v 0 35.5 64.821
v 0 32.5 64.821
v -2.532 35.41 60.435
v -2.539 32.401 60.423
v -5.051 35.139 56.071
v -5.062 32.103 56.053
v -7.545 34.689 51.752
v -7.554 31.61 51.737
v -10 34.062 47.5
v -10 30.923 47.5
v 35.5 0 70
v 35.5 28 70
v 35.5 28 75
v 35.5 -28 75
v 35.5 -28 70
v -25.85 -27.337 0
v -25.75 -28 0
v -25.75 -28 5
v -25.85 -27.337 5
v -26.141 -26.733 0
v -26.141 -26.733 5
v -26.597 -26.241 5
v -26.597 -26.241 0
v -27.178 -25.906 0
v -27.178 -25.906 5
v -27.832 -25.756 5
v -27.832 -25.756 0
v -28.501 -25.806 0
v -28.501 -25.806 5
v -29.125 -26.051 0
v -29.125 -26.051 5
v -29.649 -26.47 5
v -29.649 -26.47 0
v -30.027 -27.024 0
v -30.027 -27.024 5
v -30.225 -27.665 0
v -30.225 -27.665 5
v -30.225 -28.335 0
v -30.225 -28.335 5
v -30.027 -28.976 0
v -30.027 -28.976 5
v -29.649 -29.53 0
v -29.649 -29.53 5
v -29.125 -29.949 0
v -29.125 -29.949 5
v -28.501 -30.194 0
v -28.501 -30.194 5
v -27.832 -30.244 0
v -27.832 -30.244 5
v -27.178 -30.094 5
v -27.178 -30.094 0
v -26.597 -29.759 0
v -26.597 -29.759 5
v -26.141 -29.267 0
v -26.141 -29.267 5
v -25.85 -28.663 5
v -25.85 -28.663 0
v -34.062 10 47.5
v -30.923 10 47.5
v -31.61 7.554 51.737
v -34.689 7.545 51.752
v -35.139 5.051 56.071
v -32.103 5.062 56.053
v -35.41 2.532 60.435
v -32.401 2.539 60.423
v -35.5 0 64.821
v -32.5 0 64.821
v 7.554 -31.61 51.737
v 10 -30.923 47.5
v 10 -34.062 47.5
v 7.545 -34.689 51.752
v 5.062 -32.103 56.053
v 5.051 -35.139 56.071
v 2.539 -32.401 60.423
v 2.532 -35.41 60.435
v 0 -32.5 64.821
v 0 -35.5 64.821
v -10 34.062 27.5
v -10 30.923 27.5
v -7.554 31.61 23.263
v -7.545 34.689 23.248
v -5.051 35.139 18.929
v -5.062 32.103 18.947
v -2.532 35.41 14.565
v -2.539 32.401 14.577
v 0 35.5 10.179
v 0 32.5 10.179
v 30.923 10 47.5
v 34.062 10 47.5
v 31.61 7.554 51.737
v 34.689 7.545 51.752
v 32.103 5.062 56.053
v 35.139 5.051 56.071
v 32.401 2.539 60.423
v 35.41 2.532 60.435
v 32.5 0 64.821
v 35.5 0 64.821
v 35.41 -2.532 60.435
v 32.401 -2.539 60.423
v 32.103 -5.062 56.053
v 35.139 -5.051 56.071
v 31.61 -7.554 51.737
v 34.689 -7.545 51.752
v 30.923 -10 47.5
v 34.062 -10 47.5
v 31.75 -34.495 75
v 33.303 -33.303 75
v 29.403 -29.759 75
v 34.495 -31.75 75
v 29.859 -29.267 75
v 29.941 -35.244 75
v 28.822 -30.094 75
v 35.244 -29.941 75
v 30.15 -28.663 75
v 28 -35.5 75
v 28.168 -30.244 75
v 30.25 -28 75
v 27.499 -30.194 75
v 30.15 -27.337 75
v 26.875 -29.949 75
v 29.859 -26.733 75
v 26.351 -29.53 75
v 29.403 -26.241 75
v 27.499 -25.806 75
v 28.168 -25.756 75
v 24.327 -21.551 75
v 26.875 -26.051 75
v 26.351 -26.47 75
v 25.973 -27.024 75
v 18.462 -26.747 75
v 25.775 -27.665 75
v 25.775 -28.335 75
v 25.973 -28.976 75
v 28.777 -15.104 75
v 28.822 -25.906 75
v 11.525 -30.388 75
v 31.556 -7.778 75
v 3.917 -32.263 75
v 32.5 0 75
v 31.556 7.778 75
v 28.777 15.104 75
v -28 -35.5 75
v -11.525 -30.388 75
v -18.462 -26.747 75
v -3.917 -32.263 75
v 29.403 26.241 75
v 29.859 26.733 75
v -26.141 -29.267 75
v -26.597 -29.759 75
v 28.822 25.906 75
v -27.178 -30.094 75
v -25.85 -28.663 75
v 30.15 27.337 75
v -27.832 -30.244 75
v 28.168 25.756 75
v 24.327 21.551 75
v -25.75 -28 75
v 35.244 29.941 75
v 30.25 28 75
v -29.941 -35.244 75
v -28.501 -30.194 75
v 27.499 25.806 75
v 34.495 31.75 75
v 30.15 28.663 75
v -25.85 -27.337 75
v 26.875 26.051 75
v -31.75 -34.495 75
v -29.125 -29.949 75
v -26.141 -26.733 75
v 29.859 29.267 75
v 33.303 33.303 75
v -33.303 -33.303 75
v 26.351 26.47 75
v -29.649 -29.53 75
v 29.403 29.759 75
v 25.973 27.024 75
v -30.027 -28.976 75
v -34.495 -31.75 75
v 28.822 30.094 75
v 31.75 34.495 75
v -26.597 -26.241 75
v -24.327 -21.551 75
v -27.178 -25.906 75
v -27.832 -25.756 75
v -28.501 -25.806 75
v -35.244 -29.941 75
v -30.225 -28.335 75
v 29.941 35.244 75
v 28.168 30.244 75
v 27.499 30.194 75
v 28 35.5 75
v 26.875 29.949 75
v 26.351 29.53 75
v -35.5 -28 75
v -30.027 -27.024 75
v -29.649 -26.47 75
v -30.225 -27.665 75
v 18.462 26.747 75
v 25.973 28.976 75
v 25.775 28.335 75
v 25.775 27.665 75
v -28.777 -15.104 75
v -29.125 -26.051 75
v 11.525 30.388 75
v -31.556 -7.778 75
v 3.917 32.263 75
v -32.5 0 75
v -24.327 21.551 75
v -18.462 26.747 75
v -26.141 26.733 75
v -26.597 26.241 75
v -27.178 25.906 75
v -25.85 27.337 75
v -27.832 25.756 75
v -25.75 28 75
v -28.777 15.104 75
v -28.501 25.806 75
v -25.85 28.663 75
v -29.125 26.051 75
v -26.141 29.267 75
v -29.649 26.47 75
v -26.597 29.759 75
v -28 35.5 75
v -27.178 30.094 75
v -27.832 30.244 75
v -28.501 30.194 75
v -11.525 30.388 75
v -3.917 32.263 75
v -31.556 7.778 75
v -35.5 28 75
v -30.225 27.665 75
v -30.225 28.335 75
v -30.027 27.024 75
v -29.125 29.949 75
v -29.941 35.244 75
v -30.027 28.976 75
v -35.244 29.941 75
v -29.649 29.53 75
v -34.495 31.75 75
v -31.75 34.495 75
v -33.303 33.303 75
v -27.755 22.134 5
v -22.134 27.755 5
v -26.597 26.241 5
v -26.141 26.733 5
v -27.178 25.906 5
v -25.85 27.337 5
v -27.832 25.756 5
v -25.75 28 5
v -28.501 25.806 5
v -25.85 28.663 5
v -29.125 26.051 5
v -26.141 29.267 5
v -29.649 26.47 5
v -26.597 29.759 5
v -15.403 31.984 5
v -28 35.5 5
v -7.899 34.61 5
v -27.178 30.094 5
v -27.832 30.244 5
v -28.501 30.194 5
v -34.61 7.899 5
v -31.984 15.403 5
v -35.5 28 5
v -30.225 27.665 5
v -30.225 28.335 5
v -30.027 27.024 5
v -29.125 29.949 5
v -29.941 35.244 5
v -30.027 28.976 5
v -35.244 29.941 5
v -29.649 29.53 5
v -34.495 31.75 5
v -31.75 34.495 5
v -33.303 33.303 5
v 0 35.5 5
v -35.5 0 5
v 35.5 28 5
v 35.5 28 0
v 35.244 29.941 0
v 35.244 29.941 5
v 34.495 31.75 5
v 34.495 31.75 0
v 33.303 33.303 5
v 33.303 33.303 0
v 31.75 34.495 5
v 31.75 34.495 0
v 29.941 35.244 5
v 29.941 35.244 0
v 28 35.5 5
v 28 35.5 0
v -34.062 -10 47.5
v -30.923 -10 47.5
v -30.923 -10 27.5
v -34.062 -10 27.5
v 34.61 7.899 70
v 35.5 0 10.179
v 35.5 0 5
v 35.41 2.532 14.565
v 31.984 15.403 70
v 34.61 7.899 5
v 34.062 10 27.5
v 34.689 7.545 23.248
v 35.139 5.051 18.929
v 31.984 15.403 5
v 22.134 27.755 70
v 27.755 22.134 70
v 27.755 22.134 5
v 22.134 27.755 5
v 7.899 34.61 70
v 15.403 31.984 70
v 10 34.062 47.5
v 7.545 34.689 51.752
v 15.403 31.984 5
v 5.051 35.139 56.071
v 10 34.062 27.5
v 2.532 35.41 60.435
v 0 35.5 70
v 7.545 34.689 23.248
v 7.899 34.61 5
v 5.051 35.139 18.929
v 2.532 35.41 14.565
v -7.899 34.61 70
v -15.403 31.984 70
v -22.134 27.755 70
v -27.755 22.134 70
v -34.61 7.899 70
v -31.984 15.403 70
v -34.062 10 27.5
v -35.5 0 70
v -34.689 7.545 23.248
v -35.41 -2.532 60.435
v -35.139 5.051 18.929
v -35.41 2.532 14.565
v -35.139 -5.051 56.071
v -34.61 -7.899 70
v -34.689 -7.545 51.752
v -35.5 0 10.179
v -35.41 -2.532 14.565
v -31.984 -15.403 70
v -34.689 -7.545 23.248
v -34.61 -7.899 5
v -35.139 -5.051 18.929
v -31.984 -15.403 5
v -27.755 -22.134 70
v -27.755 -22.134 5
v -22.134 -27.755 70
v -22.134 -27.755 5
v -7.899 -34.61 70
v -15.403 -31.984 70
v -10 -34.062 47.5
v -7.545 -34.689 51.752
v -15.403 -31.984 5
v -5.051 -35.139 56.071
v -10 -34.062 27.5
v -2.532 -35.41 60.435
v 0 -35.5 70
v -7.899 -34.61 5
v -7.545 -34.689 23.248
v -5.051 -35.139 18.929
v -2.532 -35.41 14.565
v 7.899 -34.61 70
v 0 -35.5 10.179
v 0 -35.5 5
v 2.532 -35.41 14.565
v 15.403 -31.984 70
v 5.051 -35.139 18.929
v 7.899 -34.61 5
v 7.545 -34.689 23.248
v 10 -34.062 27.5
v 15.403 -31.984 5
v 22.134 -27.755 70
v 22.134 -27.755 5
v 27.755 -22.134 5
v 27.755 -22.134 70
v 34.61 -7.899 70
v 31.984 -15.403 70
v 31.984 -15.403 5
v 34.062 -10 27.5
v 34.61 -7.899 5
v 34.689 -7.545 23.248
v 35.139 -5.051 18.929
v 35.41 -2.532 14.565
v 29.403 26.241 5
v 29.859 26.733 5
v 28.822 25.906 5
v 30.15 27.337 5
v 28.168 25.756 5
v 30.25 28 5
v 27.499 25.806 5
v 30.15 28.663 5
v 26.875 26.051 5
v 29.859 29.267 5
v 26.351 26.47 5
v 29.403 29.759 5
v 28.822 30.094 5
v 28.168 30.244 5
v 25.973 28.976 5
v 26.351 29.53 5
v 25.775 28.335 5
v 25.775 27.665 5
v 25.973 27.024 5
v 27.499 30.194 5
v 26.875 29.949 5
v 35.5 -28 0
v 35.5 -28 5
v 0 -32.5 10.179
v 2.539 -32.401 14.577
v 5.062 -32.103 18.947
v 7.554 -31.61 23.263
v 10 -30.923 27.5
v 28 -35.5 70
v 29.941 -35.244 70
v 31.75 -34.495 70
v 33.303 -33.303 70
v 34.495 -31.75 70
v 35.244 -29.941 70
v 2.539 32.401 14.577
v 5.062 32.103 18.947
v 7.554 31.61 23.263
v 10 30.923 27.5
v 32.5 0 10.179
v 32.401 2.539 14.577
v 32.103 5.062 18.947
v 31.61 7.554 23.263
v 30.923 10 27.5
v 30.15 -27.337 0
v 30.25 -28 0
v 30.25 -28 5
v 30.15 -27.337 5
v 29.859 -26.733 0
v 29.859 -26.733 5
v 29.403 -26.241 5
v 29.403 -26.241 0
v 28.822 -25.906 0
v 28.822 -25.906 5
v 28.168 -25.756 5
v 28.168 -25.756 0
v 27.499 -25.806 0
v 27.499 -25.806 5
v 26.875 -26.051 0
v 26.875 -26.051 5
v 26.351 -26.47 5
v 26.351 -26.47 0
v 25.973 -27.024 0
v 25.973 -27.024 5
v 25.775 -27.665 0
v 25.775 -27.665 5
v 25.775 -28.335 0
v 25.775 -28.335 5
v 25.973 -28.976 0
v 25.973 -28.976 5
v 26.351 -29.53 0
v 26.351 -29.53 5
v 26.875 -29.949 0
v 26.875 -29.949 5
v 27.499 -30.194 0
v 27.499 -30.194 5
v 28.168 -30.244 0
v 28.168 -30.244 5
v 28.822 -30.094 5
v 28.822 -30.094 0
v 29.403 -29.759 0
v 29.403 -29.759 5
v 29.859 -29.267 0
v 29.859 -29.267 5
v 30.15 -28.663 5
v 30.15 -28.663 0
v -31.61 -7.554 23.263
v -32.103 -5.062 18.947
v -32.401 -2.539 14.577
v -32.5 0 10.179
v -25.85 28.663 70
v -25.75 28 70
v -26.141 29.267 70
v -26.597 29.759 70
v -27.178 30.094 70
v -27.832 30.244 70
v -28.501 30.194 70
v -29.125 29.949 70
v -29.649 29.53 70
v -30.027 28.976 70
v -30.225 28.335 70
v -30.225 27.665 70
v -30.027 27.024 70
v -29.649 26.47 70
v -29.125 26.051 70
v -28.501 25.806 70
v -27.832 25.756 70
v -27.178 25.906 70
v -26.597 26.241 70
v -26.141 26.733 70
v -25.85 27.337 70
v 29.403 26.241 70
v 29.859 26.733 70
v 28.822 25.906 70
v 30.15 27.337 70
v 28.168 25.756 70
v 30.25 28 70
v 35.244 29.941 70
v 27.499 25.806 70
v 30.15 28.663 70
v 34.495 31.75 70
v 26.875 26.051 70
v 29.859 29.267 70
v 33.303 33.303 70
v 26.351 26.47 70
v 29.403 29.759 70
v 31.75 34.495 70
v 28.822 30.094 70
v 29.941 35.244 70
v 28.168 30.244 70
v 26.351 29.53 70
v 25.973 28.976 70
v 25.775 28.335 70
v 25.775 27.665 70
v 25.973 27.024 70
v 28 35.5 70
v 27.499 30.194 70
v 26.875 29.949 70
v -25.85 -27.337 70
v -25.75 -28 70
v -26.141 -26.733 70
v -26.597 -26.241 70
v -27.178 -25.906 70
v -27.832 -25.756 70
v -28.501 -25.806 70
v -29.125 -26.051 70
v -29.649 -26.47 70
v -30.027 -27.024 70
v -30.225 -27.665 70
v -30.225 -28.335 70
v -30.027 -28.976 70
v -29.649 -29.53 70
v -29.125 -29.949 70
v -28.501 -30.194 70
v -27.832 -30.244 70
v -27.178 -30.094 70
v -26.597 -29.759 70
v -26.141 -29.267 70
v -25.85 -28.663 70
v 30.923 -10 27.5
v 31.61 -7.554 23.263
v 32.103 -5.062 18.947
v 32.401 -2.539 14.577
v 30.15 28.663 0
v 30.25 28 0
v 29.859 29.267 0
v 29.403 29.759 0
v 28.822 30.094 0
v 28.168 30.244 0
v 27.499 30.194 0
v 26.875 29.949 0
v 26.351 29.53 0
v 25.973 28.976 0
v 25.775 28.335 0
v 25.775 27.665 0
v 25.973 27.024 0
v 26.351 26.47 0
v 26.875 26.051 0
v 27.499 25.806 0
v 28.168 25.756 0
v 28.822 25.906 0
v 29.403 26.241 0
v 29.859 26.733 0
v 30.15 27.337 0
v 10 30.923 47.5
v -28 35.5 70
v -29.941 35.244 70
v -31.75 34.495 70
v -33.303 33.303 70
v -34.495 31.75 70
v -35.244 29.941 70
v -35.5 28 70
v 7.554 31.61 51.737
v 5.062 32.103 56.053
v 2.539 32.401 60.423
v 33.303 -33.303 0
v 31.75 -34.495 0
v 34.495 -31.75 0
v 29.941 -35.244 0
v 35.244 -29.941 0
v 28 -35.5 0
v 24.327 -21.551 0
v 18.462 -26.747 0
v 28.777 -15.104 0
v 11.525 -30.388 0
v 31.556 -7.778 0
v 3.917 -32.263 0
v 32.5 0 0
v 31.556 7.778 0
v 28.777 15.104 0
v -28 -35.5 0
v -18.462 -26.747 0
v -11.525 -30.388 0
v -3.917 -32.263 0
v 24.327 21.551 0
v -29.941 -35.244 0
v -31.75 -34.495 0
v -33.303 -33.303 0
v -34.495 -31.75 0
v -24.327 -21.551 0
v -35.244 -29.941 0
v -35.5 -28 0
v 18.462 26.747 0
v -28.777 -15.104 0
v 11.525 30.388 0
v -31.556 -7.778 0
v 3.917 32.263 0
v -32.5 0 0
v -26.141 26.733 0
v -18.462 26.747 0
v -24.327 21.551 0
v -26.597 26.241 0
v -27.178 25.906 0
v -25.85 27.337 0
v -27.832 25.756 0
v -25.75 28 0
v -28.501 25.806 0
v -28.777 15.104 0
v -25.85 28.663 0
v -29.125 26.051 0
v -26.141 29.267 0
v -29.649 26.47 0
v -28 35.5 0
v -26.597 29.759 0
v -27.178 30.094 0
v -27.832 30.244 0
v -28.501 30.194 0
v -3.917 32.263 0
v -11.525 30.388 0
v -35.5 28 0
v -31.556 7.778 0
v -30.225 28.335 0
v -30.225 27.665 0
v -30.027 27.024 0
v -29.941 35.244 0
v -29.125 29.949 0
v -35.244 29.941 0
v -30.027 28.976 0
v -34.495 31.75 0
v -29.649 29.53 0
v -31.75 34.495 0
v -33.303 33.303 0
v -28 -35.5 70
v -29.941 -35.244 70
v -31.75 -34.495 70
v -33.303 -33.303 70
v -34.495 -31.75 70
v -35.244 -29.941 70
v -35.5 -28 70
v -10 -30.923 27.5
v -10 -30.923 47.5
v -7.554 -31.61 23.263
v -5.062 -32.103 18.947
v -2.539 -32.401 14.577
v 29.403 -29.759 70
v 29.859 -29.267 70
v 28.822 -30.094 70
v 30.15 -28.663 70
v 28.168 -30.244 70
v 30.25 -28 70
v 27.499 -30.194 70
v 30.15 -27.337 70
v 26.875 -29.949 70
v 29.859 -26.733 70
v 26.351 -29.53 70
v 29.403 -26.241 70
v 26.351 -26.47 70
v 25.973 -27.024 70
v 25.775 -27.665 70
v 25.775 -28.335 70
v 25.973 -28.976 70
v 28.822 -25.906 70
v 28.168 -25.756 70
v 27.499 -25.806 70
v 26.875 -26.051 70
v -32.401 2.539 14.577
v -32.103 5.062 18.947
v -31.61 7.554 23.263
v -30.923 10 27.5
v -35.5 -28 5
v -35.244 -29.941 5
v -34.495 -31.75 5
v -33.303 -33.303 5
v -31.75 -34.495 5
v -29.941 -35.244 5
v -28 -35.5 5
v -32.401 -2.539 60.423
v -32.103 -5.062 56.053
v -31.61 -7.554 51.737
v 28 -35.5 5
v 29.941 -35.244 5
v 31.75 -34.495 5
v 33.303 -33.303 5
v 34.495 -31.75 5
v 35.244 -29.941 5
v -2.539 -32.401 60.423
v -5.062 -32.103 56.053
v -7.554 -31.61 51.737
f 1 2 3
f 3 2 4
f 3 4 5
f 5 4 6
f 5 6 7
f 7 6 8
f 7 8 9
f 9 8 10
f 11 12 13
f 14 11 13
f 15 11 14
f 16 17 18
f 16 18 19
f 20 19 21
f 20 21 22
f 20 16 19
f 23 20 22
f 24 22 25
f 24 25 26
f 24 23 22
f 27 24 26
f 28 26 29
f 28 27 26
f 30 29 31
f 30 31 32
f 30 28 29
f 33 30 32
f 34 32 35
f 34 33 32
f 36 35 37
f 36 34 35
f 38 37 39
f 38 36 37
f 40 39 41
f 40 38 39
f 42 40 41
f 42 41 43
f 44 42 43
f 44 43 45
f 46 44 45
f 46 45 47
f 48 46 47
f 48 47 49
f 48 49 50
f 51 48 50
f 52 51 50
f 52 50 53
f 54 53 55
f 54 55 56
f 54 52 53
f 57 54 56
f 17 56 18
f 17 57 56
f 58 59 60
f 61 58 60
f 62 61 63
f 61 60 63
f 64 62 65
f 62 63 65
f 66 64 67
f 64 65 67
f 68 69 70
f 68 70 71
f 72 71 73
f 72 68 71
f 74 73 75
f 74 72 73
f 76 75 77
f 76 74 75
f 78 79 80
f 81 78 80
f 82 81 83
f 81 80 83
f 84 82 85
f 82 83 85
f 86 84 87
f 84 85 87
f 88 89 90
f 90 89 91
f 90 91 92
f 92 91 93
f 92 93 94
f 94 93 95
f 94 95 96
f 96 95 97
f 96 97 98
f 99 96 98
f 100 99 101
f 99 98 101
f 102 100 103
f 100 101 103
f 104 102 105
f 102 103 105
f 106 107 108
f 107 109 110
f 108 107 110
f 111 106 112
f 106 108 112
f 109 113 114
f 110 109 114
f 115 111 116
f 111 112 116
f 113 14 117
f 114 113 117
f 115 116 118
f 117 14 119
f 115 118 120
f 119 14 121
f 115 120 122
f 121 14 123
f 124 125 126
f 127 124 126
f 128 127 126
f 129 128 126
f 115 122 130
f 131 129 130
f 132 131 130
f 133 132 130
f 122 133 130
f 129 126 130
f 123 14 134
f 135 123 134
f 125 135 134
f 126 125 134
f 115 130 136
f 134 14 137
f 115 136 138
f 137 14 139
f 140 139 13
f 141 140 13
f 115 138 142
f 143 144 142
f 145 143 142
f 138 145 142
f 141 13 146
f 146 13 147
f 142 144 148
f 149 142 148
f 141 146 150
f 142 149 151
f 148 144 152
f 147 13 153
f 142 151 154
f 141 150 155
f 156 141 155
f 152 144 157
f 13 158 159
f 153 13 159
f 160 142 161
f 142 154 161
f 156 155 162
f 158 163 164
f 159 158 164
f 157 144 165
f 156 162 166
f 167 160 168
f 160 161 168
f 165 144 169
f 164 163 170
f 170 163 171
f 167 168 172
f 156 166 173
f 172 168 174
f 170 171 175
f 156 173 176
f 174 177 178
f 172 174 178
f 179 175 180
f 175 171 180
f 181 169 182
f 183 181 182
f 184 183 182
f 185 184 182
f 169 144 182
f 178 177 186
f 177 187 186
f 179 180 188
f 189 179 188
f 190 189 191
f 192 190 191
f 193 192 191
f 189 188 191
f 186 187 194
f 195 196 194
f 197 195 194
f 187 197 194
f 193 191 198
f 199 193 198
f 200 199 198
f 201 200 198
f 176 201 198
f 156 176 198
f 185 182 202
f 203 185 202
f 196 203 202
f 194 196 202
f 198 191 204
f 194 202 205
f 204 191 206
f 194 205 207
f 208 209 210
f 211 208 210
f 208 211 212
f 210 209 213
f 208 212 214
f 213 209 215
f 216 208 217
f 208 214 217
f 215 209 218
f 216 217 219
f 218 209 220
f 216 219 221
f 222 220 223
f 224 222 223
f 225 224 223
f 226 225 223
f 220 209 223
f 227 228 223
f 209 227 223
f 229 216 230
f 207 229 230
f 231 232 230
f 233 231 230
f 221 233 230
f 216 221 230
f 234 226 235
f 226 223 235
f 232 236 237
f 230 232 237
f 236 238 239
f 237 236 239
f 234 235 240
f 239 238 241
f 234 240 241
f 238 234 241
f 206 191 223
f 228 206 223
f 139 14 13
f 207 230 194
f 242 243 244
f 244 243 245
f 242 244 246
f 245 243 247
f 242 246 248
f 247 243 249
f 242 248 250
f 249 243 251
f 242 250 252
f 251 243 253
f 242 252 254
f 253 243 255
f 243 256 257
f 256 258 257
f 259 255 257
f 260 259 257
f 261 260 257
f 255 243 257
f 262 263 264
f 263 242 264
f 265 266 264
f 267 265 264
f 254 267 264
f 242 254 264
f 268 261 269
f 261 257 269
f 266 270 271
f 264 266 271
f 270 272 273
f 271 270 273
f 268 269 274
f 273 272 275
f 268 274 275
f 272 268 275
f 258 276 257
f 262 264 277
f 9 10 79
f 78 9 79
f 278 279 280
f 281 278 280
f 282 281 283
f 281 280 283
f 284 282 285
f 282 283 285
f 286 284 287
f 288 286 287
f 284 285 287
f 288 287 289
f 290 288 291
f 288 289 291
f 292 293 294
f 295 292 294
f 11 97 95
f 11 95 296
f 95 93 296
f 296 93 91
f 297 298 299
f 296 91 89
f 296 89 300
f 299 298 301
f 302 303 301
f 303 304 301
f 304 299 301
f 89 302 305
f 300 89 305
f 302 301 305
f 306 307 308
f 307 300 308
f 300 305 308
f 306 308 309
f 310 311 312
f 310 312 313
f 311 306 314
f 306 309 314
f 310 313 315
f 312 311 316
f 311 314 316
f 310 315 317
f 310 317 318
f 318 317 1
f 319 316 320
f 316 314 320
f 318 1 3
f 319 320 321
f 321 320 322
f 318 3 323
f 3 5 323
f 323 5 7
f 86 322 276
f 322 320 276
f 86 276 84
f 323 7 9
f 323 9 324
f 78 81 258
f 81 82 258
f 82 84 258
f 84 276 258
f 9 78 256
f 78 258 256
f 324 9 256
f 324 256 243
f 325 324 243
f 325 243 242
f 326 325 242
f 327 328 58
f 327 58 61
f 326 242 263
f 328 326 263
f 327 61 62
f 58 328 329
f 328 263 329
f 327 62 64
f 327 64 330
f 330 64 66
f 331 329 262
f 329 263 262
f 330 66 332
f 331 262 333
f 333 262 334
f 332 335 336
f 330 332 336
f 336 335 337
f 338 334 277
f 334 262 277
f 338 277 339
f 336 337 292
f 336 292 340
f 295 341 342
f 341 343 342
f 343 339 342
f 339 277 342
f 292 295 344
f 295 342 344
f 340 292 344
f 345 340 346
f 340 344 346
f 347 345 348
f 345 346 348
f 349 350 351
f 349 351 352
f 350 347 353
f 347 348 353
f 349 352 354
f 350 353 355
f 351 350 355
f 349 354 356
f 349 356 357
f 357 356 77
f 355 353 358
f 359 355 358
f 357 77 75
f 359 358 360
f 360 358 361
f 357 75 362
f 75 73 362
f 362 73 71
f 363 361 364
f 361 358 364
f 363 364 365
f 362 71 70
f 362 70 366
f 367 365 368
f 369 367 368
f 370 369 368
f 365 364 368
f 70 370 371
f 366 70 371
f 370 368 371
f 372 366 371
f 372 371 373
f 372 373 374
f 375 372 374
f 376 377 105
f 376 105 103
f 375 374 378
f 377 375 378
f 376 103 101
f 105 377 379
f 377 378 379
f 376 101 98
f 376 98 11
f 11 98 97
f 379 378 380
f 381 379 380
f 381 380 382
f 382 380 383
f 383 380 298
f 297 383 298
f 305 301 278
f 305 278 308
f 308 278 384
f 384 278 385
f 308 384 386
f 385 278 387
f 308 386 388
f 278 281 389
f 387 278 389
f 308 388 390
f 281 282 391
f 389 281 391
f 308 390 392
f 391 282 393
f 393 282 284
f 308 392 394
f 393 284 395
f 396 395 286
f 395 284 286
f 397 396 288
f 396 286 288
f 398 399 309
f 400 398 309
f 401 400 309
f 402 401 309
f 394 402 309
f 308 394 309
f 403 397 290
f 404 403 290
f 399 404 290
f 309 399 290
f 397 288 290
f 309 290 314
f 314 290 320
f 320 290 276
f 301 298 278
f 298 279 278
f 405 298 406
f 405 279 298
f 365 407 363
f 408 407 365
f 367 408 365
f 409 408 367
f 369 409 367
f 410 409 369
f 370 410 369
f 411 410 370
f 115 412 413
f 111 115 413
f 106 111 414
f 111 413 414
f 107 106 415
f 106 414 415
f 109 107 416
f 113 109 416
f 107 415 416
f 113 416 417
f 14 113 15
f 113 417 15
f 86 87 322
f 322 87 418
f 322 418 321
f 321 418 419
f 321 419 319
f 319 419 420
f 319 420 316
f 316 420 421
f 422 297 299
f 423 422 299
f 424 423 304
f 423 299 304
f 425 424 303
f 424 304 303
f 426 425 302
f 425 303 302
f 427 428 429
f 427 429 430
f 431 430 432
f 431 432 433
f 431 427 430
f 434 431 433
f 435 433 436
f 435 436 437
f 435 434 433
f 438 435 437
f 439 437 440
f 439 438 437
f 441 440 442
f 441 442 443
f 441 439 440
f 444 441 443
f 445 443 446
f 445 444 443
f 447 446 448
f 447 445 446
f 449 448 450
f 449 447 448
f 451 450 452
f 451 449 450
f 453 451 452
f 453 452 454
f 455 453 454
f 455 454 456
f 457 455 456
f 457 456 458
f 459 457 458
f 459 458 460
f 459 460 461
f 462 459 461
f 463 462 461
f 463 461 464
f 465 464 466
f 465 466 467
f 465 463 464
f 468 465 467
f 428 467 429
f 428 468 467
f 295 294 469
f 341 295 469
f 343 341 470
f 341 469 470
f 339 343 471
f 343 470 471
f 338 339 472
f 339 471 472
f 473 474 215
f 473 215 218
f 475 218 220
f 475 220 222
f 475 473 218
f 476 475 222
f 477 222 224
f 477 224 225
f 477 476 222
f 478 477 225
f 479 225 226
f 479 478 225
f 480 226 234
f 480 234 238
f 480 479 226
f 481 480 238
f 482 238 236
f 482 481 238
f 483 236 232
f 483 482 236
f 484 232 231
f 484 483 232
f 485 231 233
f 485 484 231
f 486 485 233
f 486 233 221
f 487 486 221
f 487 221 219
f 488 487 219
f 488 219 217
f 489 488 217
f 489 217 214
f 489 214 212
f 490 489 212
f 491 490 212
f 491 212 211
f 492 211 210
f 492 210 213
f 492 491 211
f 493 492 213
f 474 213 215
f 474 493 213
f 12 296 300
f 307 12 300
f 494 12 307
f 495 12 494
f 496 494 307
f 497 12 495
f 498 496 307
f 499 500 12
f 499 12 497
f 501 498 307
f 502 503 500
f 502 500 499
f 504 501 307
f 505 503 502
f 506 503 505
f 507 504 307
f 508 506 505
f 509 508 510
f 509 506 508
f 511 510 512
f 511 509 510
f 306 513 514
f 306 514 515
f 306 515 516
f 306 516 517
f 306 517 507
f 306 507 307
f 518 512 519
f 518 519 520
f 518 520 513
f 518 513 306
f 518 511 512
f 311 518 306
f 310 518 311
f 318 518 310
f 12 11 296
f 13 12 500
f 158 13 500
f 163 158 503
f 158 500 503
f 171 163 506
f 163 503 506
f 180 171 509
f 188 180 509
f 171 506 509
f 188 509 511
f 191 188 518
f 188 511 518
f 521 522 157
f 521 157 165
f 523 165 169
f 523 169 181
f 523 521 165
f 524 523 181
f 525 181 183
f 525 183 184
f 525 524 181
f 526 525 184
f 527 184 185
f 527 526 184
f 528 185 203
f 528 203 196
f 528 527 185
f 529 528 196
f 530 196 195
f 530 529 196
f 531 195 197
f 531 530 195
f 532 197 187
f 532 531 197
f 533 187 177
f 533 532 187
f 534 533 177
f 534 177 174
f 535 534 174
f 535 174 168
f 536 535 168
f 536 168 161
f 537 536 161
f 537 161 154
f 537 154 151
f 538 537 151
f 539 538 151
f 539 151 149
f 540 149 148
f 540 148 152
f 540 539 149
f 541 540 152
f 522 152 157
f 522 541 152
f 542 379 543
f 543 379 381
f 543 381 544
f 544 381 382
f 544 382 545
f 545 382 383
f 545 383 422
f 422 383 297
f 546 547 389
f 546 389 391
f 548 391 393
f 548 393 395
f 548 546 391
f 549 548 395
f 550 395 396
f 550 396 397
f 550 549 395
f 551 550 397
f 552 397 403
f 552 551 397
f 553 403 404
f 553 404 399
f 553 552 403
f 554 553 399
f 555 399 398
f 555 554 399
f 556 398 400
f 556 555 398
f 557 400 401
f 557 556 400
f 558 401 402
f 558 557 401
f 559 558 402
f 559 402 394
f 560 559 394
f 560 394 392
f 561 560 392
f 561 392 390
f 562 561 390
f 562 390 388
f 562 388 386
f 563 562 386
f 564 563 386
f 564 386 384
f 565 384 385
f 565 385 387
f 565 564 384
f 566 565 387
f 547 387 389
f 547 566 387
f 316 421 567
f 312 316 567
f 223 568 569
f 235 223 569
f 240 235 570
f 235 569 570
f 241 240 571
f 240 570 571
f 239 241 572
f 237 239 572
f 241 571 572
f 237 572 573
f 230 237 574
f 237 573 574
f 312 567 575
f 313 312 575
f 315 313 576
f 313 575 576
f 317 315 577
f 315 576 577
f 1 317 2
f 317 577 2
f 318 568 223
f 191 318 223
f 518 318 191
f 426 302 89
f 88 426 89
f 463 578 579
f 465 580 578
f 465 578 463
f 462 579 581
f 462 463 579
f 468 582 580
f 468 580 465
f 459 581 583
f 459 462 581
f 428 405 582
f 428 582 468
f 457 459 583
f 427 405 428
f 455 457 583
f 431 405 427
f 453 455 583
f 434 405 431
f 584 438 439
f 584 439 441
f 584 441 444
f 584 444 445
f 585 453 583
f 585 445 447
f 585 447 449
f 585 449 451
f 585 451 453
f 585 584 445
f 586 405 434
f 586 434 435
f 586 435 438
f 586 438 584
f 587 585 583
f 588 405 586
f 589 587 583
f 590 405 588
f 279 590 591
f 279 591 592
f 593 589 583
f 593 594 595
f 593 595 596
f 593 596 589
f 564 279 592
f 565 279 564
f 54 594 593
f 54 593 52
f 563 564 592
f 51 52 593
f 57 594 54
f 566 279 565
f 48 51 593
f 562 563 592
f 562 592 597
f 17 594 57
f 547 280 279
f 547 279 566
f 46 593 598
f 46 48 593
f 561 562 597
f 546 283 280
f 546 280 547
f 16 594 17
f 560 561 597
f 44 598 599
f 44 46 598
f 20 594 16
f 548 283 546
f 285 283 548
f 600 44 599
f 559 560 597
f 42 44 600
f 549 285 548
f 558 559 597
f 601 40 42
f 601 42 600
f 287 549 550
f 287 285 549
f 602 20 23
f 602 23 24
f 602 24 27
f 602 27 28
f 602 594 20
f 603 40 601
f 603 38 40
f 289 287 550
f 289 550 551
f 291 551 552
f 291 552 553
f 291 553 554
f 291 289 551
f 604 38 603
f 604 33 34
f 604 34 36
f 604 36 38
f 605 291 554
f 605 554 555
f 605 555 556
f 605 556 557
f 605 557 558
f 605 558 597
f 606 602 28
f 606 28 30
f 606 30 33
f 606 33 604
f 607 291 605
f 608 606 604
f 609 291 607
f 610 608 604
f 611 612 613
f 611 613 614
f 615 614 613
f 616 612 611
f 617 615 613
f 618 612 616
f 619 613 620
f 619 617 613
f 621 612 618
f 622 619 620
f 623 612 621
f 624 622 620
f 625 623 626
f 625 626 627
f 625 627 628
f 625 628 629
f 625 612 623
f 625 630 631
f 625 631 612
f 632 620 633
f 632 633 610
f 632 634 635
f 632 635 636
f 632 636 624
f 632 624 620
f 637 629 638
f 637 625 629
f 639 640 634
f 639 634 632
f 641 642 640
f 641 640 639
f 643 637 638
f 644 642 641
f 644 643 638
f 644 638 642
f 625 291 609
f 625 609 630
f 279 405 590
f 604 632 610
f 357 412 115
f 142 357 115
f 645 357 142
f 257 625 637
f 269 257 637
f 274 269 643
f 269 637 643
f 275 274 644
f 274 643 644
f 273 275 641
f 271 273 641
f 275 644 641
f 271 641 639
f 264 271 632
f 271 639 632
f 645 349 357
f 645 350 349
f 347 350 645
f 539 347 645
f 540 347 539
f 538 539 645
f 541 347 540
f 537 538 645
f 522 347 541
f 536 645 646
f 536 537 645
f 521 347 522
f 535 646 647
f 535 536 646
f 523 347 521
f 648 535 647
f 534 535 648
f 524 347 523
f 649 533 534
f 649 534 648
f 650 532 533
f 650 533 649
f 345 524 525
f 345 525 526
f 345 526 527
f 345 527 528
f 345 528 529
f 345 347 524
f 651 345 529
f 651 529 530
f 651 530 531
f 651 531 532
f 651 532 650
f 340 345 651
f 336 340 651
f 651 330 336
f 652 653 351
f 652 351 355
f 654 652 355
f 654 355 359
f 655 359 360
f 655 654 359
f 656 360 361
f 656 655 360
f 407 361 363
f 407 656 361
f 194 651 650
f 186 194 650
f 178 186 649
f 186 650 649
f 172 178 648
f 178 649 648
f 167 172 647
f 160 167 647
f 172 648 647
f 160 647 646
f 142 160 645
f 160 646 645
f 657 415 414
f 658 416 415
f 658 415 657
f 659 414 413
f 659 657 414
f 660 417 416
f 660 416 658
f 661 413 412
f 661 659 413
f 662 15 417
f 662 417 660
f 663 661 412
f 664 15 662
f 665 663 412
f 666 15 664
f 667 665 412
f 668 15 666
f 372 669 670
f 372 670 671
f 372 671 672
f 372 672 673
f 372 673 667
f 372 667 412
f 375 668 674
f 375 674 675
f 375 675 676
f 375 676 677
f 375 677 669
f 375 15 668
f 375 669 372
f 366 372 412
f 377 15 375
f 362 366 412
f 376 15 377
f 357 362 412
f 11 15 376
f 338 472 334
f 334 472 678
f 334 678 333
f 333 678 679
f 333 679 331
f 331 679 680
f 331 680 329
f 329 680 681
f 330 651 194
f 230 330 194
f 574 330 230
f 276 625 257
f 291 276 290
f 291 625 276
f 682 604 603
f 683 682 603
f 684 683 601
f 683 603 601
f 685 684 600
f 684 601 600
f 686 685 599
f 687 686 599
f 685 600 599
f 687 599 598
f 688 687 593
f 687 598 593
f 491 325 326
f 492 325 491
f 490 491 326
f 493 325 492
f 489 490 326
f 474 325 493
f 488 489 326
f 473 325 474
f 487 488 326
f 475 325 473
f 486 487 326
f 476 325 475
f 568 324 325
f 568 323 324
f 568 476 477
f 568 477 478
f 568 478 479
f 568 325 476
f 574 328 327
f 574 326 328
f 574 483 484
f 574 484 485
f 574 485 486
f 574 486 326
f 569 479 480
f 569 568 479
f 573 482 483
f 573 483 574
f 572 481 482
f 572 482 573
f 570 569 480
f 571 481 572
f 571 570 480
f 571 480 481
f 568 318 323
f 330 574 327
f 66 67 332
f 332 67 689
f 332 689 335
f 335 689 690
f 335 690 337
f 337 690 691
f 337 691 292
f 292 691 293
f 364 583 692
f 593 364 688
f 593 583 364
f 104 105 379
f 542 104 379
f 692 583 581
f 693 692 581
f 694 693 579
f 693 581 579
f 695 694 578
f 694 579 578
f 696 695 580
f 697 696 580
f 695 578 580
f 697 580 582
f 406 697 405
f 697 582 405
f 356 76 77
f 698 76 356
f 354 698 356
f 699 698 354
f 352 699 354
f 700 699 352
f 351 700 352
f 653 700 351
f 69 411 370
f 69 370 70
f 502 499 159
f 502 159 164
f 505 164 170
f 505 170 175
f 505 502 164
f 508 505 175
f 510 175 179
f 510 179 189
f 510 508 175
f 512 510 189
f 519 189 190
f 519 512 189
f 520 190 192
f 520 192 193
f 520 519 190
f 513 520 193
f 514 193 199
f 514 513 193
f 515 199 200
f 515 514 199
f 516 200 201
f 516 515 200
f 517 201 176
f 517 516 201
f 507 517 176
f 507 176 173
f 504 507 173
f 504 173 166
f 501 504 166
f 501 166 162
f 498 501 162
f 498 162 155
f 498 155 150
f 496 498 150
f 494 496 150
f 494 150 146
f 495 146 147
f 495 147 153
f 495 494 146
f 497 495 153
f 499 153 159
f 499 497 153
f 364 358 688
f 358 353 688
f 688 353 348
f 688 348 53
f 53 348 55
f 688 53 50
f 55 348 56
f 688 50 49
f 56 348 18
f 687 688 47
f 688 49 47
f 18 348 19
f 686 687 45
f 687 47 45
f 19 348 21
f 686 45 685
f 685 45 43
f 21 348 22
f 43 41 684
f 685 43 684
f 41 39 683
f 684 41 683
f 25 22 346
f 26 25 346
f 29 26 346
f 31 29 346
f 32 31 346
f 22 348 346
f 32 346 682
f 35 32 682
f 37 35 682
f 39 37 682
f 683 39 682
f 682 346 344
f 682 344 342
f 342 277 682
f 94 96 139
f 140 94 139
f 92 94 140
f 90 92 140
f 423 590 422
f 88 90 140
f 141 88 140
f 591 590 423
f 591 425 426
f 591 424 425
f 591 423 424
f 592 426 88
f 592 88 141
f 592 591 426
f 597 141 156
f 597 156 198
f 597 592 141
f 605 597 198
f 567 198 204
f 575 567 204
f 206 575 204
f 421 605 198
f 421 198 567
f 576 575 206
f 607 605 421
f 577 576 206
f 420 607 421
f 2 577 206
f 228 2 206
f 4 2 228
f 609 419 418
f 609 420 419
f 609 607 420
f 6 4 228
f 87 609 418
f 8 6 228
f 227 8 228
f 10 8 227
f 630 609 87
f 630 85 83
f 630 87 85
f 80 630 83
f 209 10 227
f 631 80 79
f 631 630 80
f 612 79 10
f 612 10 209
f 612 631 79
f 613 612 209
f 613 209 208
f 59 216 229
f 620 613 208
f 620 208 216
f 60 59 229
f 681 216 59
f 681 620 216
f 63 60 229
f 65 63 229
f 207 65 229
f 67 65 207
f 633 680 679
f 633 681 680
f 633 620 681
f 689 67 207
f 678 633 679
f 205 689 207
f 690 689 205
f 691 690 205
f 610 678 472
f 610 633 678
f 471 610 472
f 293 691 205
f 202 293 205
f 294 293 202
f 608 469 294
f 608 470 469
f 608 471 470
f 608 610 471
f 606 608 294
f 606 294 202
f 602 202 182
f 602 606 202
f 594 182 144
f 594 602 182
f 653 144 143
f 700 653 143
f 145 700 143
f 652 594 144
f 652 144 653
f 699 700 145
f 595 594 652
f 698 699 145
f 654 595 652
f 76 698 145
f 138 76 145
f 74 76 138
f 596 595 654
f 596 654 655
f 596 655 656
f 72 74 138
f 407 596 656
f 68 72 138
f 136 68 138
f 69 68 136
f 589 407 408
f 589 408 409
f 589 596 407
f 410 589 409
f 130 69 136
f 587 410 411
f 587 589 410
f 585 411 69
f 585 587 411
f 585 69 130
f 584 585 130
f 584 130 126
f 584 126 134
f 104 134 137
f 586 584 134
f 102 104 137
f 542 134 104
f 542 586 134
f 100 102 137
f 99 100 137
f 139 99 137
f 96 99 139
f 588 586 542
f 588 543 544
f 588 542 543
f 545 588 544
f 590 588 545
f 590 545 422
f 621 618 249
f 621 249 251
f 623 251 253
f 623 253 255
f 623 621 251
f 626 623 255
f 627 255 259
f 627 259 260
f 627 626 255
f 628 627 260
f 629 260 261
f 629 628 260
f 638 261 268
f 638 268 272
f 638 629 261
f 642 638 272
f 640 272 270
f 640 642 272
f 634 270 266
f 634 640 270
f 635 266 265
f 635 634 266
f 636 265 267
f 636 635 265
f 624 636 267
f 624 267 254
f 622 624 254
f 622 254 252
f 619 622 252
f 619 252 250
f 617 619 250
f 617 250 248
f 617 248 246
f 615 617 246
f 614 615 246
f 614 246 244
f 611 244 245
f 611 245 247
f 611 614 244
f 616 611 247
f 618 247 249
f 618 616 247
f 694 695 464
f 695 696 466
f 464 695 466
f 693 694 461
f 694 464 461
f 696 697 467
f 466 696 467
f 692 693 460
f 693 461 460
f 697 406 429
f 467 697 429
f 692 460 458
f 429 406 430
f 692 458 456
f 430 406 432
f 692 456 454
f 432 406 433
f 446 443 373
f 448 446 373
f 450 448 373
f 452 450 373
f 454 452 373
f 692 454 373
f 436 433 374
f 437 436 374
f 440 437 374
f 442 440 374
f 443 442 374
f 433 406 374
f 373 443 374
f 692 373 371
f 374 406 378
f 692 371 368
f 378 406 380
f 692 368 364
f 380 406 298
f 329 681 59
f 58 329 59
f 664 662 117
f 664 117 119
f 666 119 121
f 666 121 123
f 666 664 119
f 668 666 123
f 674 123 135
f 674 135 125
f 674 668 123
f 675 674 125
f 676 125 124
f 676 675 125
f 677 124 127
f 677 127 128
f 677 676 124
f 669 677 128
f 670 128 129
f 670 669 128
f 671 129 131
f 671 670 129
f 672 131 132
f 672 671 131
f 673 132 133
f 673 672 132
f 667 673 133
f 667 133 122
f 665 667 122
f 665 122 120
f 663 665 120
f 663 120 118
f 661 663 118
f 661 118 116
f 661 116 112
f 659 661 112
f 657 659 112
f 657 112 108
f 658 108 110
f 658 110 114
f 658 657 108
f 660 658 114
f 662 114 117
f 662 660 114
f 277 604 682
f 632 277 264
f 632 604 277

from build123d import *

# Parameters (mm, degrees)
SKETCH_R           = 35.5
SKETCH_R_2         = 32.5
PAD_DEPTH          = 75
SKETCH001_R        = 2.25
SKETCH001_R_2      = 35
PAD001_DEPTH       = 5
SKETCH002_R        = 2.25
SKETCH002_R_2      = 35
PAD002_DEPTH       = 5
POCKET_DEPTH       = 286.156142
POCKET_DEPTH_BACK  = 286.156142
POLARPATTERN_COUNT = 2
POLARPATTERN_ANGLE = 90


with BuildPart() as part:
    # Sketch → Pad (new body)
    with BuildSketch(Plane.XY):
        Circle(SKETCH_R)
        Circle(SKETCH_R_2, mode=Mode.SUBTRACT)
    extrude(amount=PAD_DEPTH)

    # Sketch001 → Pad001 (join)
    with BuildSketch(Plane.XY):
        with BuildLine():
            Line((-28, 35.5), (28, 35.5))
            ThreePointArc((35.5, 28), (33.303301, 33.303301), (28, 35.5))
            Line((35.5, 28), (35.5, -28))
            ThreePointArc((28, -35.5), (33.303301, -33.303301), (35.5, -28))
            Line((28, -35.5), (-28, -35.5))
            ThreePointArc((-35.5, -28), (-33.303301, -33.303301), (-28, -35.5))
            Line((-35.5, -28), (-35.5, 28))
            ThreePointArc((-28, 35.5), (-33.303301, 33.303301), (-35.5, 28))
        make_face()
        with Locations((-28, 28)):
            Circle(SKETCH001_R, mode=Mode.SUBTRACT)
        with Locations((28, 28)):
            Circle(SKETCH001_R, mode=Mode.SUBTRACT)
        with Locations((28, -28)):
            Circle(SKETCH001_R, mode=Mode.SUBTRACT)
        with Locations((-28, -28)):
            Circle(SKETCH001_R, mode=Mode.SUBTRACT)
        Circle(SKETCH001_R_2, mode=Mode.SUBTRACT)
    extrude(amount=PAD001_DEPTH)

    # Sketch002 → Pad002 (join)
    with BuildSketch(Plane.XY.offset(70)):
        with BuildLine():
            Line((-28, 35.5), (28, 35.5))
            ThreePointArc((35.5, 28), (33.303301, 33.303301), (28, 35.5))
            Line((35.5, 28), (35.5, -28))
            ThreePointArc((28, -35.5), (33.303301, -33.303301), (35.5, -28))
            Line((28, -35.5), (-28, -35.5))
            ThreePointArc((-35.5, -28), (-33.303301, -33.303301), (-28, -35.5))
            Line((-35.5, -28), (-35.5, 28))
            ThreePointArc((-28, 35.5), (-33.303301, 33.303301), (-35.5, 28))
        make_face()
        with Locations((-28, 28)):
            Circle(SKETCH002_R, mode=Mode.SUBTRACT)
        with Locations((28, 28)):
            Circle(SKETCH002_R, mode=Mode.SUBTRACT)
        with Locations((28, -28)):
            Circle(SKETCH002_R, mode=Mode.SUBTRACT)
        with Locations((-28, -28)):
            Circle(SKETCH002_R, mode=Mode.SUBTRACT)
        Circle(SKETCH002_R_2, mode=Mode.SUBTRACT)
    extrude(amount=PAD002_DEPTH)

    # Sketch003 → Pocket (cut, two sides)
    with BuildSketch(Plane.XZ) as pocket_sk:
        Polygon((0, 64.820508), (-10, 47.5), (-10, 27.5), (0, 10.179492), (10, 27.5), (10, 47.5), align=None)
    pocket = extrude(amount=-POCKET_DEPTH, mode=Mode.SUBTRACT) + extrude(pocket_sk.sketch, amount=POCKET_DEPTH_BACK, mode=Mode.SUBTRACT)

    # PolarPattern: Pocket ×2 about axis
    polarpattern_axis = Axis((0, 0, 0), (0, 0, 1))
    for i in range(1, POLARPATTERN_COUNT):
        add(pocket.rotate(polarpattern_axis, i * POLARPATTERN_ANGLE / (POLARPATTERN_COUNT - 1)), mode=Mode.SUBTRACT)


solid = part.part
